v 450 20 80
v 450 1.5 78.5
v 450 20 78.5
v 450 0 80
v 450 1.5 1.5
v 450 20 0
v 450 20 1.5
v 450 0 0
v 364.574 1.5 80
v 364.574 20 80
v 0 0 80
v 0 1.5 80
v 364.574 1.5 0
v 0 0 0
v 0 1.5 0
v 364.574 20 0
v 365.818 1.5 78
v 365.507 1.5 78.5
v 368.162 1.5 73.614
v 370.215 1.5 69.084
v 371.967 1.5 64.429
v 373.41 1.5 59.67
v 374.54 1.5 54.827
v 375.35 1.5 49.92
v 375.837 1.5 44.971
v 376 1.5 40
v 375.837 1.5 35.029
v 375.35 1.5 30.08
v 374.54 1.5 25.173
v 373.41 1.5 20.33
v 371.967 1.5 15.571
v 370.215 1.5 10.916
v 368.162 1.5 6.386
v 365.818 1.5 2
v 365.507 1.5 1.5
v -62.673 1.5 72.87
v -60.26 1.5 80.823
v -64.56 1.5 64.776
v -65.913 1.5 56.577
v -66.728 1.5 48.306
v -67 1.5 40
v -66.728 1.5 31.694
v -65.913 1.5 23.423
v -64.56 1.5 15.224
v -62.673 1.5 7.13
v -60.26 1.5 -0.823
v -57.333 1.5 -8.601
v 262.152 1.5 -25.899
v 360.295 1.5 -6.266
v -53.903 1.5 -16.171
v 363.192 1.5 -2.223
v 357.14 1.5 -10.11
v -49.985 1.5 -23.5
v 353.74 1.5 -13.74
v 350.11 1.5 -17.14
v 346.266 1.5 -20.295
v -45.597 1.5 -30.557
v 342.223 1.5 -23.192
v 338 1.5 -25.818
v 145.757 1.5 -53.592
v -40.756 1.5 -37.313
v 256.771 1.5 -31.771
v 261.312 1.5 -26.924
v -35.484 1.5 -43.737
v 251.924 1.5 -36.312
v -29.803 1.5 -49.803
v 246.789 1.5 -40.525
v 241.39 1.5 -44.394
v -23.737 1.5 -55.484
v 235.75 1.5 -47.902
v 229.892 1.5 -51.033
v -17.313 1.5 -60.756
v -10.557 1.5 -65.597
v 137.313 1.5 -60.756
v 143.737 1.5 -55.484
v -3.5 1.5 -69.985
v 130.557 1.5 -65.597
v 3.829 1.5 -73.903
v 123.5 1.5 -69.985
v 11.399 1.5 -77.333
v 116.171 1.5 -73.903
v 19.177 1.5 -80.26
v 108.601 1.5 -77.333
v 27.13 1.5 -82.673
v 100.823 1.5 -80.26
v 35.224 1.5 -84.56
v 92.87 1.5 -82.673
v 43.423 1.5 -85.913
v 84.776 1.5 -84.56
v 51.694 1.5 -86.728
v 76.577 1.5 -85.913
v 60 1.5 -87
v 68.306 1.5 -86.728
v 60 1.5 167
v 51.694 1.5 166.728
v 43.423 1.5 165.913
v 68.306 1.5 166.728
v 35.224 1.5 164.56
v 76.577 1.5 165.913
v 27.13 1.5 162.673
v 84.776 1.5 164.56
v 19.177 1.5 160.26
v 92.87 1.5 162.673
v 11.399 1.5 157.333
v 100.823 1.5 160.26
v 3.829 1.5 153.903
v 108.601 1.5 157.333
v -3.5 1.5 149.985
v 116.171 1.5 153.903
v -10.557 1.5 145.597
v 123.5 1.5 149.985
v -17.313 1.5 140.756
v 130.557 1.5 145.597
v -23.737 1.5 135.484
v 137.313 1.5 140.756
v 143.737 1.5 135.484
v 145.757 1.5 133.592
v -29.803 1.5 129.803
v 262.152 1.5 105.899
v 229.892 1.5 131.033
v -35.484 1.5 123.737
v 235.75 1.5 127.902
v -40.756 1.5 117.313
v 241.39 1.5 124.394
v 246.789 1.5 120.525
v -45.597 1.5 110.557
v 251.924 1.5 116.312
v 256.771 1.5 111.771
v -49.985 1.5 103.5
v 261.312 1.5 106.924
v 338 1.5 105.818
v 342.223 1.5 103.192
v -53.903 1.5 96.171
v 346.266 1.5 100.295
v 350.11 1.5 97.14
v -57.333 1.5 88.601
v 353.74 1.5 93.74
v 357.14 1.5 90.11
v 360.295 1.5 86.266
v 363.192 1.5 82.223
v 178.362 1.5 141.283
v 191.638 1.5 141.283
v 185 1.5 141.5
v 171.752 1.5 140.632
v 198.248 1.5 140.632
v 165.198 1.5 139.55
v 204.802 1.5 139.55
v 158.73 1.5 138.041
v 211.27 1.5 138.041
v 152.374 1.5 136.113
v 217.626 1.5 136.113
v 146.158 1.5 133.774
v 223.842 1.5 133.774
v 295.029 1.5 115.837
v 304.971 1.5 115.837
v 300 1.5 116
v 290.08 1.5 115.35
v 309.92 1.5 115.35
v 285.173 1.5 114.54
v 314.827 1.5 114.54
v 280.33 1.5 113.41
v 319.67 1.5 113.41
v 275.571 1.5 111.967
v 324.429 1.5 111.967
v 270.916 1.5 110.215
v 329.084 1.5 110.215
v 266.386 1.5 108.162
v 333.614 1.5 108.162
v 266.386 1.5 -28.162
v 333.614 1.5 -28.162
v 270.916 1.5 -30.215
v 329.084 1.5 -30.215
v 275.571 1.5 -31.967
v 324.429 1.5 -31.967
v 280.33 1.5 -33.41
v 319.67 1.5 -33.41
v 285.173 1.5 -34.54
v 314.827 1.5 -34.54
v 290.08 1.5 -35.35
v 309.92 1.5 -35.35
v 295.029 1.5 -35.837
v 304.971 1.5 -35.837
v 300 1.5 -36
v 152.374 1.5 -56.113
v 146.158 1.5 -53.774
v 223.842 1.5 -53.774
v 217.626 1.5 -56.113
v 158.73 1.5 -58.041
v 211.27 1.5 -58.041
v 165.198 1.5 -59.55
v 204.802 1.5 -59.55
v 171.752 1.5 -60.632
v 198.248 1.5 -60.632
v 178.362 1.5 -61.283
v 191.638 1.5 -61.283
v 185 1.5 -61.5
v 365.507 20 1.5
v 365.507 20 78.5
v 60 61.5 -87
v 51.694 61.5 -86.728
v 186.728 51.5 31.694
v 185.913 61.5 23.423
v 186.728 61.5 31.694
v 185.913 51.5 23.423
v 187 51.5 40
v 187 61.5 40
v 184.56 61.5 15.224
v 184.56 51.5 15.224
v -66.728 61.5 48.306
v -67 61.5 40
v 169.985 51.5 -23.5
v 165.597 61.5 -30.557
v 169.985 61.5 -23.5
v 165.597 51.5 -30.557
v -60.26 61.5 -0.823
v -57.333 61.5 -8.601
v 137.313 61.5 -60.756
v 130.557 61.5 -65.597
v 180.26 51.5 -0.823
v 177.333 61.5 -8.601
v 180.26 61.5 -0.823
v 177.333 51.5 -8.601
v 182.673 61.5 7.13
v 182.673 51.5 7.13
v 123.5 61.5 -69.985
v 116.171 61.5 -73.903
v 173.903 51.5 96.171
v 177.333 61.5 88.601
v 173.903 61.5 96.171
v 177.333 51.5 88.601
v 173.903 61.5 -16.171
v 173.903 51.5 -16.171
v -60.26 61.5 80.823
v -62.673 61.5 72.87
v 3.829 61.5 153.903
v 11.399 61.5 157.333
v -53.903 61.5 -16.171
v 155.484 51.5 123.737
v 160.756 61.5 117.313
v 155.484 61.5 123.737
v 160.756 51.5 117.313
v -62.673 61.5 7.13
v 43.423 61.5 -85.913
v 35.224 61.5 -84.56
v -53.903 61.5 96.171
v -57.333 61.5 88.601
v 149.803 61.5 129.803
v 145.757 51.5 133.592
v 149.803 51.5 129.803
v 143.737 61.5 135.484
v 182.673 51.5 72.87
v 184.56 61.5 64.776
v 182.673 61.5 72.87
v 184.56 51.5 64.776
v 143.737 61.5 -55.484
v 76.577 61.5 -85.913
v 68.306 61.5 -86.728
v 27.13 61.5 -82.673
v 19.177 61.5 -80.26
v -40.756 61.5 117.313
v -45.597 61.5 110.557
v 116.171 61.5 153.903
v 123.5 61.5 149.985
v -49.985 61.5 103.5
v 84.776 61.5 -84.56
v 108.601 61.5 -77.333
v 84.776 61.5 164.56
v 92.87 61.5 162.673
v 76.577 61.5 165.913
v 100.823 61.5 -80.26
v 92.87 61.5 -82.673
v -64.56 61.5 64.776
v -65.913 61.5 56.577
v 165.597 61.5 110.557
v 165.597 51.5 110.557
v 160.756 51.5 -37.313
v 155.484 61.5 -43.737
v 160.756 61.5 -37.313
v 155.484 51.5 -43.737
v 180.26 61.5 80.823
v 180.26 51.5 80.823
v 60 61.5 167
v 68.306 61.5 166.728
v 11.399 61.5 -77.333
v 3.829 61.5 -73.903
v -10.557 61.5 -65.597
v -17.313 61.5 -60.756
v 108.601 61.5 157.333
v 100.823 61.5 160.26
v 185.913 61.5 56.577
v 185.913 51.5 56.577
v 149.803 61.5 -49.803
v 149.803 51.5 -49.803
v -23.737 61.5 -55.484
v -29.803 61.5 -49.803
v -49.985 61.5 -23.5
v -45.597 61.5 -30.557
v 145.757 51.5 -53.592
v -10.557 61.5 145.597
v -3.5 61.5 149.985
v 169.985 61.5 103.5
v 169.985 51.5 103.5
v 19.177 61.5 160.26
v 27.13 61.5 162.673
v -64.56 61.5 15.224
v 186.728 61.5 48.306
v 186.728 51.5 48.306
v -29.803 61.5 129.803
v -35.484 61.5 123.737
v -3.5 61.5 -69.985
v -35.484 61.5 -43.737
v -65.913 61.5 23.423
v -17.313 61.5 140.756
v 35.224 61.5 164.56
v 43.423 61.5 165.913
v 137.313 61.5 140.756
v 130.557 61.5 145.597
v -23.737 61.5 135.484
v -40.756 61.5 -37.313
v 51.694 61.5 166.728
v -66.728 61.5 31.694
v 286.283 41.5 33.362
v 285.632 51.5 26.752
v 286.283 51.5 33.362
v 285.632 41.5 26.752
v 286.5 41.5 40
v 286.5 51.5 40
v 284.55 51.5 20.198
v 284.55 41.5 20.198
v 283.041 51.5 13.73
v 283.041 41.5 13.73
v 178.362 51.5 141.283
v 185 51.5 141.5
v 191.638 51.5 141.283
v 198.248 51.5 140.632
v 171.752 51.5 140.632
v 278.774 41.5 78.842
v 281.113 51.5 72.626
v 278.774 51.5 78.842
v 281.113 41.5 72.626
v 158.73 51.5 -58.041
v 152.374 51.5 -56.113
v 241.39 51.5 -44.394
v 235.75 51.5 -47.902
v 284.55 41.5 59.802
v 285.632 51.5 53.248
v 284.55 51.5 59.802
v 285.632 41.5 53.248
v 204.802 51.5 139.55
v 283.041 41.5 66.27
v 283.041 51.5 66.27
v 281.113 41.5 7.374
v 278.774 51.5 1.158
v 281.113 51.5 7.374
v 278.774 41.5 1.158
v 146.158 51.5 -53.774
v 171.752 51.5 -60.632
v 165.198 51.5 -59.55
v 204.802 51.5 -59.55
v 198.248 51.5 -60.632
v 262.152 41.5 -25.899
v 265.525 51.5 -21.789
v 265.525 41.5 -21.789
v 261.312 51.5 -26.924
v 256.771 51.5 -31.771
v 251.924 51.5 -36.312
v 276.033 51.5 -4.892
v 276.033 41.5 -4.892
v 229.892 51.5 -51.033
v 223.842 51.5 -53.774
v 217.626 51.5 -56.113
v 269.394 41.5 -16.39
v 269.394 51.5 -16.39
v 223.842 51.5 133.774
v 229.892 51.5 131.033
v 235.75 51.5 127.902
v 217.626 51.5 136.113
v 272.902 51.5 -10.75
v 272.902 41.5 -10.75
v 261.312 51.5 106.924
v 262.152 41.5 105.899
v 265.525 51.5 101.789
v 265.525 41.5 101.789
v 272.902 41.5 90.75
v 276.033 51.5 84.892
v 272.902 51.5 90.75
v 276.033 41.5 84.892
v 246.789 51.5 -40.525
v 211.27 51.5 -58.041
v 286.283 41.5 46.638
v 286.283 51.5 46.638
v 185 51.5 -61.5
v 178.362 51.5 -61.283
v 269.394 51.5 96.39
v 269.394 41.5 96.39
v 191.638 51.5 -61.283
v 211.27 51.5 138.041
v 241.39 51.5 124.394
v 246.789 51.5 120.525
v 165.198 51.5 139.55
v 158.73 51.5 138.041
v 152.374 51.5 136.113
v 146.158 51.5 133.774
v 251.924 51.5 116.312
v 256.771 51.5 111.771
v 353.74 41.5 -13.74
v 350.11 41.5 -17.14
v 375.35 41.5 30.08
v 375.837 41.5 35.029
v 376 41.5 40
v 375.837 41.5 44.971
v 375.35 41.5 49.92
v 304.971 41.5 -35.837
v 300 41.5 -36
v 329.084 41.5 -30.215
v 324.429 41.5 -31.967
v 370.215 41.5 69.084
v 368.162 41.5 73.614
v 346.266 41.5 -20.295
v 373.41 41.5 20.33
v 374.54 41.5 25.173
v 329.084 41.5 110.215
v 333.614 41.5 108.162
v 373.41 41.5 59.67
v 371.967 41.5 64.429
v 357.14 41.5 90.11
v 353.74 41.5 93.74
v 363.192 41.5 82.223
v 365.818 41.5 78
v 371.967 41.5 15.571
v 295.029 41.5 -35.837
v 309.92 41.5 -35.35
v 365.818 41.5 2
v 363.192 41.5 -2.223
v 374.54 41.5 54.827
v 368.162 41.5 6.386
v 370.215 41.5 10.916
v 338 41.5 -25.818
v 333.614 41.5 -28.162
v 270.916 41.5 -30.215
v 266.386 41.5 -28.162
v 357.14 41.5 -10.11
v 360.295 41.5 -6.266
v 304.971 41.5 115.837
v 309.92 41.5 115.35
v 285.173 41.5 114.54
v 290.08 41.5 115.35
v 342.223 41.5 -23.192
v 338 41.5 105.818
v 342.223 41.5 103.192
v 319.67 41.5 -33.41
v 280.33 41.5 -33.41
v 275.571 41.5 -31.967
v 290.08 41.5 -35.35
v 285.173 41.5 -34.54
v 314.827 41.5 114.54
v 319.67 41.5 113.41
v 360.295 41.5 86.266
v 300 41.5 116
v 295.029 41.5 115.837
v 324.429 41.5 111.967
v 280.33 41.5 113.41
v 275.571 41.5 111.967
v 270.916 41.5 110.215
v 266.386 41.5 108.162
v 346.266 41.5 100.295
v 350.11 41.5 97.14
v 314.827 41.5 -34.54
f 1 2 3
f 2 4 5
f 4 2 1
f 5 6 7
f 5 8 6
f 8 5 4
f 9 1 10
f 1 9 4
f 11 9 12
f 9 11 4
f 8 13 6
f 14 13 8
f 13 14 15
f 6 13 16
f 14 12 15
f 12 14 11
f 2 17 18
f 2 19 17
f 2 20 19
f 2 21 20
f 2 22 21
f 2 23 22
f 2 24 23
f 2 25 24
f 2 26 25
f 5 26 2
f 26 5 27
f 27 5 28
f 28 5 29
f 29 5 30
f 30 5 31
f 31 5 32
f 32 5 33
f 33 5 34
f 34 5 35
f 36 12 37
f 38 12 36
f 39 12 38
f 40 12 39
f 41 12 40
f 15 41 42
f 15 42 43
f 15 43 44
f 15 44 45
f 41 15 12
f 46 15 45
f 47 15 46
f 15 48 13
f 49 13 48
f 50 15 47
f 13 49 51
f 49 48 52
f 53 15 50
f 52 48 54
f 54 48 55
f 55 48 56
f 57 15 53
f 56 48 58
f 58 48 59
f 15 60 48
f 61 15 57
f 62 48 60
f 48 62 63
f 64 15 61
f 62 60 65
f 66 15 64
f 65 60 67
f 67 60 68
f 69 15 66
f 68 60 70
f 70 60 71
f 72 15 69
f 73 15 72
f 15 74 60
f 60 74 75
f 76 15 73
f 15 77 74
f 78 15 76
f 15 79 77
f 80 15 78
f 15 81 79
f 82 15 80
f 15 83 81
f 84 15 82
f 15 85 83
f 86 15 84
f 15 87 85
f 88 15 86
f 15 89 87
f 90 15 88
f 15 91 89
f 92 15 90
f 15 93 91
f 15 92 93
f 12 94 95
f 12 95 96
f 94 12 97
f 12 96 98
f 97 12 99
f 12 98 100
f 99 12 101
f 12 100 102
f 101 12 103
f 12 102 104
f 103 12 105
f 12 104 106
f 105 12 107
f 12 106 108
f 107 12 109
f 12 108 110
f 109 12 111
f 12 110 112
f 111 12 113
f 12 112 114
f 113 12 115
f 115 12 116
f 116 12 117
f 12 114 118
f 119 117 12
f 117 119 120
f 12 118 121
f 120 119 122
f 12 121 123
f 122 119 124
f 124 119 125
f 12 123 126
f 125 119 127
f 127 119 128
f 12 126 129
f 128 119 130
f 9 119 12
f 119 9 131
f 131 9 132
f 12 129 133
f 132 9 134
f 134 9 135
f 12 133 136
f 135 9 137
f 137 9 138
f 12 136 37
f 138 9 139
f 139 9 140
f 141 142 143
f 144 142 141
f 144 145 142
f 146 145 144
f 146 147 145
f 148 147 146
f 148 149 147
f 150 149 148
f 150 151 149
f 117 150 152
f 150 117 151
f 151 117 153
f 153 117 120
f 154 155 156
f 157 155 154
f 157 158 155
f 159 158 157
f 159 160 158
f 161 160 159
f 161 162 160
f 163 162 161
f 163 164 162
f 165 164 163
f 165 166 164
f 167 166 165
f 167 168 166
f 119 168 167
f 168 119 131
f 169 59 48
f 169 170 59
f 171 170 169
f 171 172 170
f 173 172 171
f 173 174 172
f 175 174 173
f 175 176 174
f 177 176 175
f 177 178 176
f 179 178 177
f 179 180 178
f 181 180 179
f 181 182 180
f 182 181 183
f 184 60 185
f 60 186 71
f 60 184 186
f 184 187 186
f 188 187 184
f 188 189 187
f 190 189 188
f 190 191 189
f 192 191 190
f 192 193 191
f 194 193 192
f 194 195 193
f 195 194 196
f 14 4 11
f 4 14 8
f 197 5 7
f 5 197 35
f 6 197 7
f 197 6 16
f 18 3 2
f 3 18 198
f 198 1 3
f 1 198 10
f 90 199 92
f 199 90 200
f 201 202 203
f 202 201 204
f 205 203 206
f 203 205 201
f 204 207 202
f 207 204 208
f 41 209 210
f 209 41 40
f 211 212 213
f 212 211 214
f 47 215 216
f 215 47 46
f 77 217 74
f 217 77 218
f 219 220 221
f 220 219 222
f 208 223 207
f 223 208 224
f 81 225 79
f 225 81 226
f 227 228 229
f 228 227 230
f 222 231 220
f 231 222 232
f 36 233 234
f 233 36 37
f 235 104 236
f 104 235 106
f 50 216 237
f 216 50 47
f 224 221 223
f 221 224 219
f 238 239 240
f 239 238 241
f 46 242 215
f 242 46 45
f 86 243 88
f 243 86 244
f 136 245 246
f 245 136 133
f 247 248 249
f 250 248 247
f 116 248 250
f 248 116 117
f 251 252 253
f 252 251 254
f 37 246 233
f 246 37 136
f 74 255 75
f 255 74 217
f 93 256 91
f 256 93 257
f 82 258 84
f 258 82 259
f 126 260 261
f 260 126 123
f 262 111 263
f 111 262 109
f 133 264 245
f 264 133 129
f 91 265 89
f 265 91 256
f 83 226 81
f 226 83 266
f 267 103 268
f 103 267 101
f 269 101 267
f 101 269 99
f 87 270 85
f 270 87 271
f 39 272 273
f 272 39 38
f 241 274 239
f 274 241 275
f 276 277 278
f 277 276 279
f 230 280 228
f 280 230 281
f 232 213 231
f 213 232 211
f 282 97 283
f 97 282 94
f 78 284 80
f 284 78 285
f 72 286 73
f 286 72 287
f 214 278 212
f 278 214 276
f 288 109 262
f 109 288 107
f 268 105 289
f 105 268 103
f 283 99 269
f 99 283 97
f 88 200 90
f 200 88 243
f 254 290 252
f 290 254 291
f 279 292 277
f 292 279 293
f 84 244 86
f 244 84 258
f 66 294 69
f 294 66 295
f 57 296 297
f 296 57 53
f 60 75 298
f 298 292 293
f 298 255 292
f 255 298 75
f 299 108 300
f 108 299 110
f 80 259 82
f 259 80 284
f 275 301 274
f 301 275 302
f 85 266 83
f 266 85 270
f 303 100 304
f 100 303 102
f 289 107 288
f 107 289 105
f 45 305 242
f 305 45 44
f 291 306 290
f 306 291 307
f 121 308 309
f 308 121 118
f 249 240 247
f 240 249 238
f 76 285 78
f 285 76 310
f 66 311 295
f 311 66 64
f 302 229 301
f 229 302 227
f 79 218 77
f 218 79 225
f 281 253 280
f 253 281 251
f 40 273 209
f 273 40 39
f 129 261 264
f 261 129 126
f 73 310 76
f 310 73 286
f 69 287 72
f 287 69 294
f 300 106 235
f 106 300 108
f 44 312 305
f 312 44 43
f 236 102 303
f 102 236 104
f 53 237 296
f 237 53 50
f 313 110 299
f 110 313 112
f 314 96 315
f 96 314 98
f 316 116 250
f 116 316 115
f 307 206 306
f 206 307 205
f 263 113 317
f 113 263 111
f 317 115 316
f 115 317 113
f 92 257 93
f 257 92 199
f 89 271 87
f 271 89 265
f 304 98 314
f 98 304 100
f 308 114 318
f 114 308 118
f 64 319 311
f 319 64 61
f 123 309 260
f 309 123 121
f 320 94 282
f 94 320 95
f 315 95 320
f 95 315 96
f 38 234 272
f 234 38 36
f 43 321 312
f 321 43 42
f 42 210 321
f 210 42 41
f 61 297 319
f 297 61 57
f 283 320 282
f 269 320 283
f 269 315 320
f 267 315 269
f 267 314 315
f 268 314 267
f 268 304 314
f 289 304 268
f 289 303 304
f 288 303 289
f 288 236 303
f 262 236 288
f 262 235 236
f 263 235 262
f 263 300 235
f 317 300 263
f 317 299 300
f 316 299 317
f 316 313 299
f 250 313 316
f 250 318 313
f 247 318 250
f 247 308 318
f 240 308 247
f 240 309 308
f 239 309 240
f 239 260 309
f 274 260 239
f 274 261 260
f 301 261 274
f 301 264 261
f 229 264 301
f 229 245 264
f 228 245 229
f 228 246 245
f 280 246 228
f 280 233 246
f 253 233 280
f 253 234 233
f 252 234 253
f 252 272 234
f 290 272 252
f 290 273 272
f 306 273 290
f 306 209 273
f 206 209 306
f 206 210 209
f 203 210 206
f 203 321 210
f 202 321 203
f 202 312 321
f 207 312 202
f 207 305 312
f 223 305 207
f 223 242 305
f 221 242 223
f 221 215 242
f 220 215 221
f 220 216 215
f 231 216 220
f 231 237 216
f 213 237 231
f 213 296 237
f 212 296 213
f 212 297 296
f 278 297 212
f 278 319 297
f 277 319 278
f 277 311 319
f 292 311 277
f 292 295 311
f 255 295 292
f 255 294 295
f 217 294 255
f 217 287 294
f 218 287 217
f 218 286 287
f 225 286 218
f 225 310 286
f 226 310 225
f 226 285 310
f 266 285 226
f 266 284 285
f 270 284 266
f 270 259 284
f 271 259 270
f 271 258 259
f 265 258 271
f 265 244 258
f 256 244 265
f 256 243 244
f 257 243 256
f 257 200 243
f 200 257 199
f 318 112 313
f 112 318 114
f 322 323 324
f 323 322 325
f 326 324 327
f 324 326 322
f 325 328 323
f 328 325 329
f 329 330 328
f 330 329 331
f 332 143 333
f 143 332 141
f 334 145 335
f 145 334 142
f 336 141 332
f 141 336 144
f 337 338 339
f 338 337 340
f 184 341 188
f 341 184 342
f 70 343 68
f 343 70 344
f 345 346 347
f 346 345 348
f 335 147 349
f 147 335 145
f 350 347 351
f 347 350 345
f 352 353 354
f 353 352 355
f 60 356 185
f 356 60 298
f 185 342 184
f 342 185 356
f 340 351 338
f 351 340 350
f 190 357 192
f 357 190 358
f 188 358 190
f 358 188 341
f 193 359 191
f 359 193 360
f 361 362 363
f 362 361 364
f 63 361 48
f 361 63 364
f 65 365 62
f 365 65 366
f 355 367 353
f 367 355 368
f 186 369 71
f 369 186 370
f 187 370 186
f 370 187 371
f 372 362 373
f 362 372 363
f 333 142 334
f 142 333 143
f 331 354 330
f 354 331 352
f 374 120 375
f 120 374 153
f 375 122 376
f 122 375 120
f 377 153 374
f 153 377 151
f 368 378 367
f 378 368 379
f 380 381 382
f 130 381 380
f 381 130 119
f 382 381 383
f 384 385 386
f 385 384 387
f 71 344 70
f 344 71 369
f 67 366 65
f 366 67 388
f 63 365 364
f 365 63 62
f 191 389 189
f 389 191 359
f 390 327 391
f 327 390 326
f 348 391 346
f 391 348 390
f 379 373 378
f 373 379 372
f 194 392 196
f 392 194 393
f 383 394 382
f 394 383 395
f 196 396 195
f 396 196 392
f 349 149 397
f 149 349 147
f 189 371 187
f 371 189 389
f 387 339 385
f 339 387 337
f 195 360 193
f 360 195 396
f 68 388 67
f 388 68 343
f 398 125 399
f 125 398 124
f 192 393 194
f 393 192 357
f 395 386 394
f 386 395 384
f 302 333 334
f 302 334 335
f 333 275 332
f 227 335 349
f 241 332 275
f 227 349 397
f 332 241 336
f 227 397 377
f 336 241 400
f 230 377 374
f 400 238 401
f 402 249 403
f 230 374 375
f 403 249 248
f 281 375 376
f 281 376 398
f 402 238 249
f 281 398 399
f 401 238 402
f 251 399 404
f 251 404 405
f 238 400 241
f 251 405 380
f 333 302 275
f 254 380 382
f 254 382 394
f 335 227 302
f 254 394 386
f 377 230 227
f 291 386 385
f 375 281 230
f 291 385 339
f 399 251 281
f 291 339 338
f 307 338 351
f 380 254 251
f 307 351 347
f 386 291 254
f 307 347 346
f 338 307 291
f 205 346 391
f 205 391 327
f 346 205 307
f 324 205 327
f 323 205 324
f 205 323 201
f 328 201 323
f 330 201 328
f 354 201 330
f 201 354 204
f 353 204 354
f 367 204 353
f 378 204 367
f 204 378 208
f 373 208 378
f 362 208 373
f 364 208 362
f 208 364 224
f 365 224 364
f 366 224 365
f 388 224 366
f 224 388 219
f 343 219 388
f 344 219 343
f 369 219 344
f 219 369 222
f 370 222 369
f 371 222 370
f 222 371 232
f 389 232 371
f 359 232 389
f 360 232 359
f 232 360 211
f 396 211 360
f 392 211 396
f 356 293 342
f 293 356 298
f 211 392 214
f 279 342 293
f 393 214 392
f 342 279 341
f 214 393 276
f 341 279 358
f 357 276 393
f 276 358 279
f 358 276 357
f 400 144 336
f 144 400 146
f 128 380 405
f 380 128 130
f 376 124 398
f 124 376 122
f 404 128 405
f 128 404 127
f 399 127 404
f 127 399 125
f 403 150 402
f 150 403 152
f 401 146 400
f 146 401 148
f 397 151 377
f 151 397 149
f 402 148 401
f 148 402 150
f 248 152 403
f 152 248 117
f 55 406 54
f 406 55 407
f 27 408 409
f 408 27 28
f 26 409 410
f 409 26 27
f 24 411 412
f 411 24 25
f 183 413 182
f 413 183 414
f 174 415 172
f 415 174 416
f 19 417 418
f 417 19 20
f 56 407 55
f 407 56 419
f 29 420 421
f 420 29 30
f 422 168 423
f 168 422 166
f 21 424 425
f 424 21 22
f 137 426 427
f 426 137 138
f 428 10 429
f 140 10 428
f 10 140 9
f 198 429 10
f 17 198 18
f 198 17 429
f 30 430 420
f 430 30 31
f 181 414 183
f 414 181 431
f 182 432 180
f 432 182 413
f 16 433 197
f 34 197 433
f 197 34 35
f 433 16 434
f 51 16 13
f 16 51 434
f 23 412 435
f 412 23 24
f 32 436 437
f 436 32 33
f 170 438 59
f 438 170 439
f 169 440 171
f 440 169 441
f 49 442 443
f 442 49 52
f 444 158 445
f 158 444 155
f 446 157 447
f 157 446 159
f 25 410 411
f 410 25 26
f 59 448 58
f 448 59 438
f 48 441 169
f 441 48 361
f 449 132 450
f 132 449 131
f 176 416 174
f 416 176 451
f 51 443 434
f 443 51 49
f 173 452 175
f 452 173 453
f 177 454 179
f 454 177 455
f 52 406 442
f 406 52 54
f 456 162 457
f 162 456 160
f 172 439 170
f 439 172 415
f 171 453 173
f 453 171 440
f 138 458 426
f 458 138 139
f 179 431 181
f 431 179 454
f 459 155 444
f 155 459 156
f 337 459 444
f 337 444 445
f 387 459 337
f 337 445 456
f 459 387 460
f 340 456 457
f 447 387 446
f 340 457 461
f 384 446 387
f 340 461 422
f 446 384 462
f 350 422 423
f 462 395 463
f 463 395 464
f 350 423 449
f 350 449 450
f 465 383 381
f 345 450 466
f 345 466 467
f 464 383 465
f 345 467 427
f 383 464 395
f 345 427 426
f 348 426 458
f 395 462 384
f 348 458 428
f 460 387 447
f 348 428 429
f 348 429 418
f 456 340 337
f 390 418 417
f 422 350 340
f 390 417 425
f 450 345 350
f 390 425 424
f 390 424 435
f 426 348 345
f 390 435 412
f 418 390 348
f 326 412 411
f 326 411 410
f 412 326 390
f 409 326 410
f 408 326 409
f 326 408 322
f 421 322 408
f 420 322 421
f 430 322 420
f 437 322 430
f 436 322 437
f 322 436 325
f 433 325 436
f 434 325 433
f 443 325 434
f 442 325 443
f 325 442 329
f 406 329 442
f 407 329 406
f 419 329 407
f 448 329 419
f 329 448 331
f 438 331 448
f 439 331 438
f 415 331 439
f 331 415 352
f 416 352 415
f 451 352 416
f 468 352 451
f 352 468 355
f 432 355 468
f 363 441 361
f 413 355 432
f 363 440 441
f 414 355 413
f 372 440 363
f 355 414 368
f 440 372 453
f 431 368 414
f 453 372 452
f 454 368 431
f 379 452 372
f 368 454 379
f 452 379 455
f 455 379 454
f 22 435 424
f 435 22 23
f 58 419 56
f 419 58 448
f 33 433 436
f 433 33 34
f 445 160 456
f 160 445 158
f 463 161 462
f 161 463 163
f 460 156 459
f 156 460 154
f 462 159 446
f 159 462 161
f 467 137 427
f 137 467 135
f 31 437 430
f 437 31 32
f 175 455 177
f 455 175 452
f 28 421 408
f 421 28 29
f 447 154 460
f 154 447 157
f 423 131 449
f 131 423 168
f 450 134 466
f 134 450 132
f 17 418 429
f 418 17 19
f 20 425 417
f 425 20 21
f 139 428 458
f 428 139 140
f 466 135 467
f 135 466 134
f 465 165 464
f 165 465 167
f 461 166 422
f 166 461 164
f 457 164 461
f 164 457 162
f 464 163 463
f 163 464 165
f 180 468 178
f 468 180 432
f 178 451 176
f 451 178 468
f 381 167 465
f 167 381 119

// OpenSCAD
// Tunable Snare Frame Array parametric master — three shell envelopes +
// mounting frame envelope.
//
// Authority: pending_measurement. NOT fabrication authority until reviewed
// against a formed/welded prototype (see visual-output-register.csv V5-REG-027
// and cad/mcp-session-log.md).
//
// SCOPE: this master models (a) the three rolled-cylinder shell envelopes
// (Drum A/B/C, OD + depth only — wall-thickness offset, weld seam, bearing-
// edge chamfer, and lug-hole pattern are NOT modeled, see flat-pattern-
// checklist.md), and (b) the mounting-frame flat-blank envelope (web +
// folded flanges, per flat-pattern-checklist.md's resolved bend geometry).
//
// EXPLICITLY OUT OF SCOPE: the frame's per-drum cutout holes and exact drum
// center spacing. solidworks-plan.md itself flags this as unresolved — its
// own math check reads "127 + 50 + 101.5 + 40 + 76 = 394.5 mm for 3 radii +
// 2 gaps. Adjust spacing to 450 mm frame" (an open TODO), and the plan's
// stated cutout diameters (256/205/154 mm) do not fit inside the stated
// 80 mm web height as literal full circles. Rather than invent a resolution
// to that open contradiction, the three shells below are positioned at the
// plan's literal reference x-positions (60/185/300 mm) for layout reference
// ONLY — this is not cutout/fabrication authority. Fit-up must be resolved
// by a reviewed CAD session before L3.
//
// Dimension sources (do not edit values without updating the source record):
//   - drum_*_od_standard, drum_*_depth, shell_thickness_mm: parameters.csv
//   - frame web/flange/thickness: flat-pattern-checklist.md "Frame Flat Blank"
//     (450.0mm width, 131.5mm flat blank height = 20 + 5.74 + 80 + 5.74 + 20)
//   - drum reference x-positions (60/185/300mm): solidworks-plan.md
//     "Mounting Frame Modeling" step 4 (explicitly flagged unresolved there)
//
// Units: millimeters.

/* [Shell envelopes — parameters.csv, Remo Ambassador catalog ODs] */
drum_a_od_mm   = 254; // parameters.csv drum_a_od_standard (10in)
drum_a_depth_mm = 60; // parameters.csv drum_a_depth
drum_b_od_mm   = 203; // parameters.csv drum_b_od_standard (8in)
drum_b_depth_mm = 50; // parameters.csv drum_b_depth
drum_c_od_mm   = 152; // parameters.csv drum_c_od_standard (6in)
drum_c_depth_mm = 40; // parameters.csv drum_c_depth
shell_thickness_mm = 1.0; // parameters.csv shell_thickness_mm (documented,
                           // not modeled as a wall offset — see SCOPE above)

/* [Mounting frame — flat-pattern-checklist.md "Frame Flat Blank", resolved] */
frame_width_mm      = 450;  // flat-pattern-checklist.md
frame_web_height_mm = 80;   // flat-pattern-checklist.md (web only, formed part)
frame_flange_mm     = 20;   // flat-pattern-checklist.md (each end, formed 90deg)
frame_thickness_mm  = 1.5;  // parameters.csv frame_thickness_mm

/* [Reference layout only — solidworks-plan.md, NOT cutout authority] */
drum_a_x_mm = 60;
drum_b_x_mm = 185;
drum_c_x_mm = 300;

$fn = 96;

module drum_shell(od, depth, x) {
  translate([x, frame_thickness_mm, frame_web_height_mm / 2])
    rotate([-90, 0, 0])
      cylinder(h = depth, d = od);
}

module mounting_frame() {
  // Web: flat panel, width x web_height, thickness along Y.
  cube([frame_width_mm, frame_thickness_mm, frame_web_height_mm]);
  // Bottom flange, folded 90deg toward +Y (drum side).
  translate([0, 0, 0])
    cube([frame_width_mm, frame_flange_mm, frame_thickness_mm]);
  // Top flange, folded 90deg toward +Y (drum side).
  translate([0, 0, frame_web_height_mm - frame_thickness_mm])
    cube([frame_width_mm, frame_flange_mm, frame_thickness_mm]);
}

module snare_array_assembly() {
  mounting_frame();
  drum_shell(drum_a_od_mm, drum_a_depth_mm, drum_a_x_mm);
  drum_shell(drum_b_od_mm, drum_b_depth_mm, drum_b_x_mm);
  drum_shell(drum_c_od_mm, drum_c_depth_mm, drum_c_x_mm);
}

snare_array_assembly();

// Render-time check against flat-pattern-checklist.md flat blank height:
// 20 + 5.74 + 80 + 5.74 + 20 = 131.5mm (bend-allowance not modeled in the
// formed-part envelope above; echoed here for cross-reference only).
echo(str("flat_blank_height_check_mm=", 20 + 5.74 + 80 + 5.74 + 20));
echo("NOTE: frame cutouts + exact drum spacing are unresolved in source docs (see SCOPE) — not modeled.");
